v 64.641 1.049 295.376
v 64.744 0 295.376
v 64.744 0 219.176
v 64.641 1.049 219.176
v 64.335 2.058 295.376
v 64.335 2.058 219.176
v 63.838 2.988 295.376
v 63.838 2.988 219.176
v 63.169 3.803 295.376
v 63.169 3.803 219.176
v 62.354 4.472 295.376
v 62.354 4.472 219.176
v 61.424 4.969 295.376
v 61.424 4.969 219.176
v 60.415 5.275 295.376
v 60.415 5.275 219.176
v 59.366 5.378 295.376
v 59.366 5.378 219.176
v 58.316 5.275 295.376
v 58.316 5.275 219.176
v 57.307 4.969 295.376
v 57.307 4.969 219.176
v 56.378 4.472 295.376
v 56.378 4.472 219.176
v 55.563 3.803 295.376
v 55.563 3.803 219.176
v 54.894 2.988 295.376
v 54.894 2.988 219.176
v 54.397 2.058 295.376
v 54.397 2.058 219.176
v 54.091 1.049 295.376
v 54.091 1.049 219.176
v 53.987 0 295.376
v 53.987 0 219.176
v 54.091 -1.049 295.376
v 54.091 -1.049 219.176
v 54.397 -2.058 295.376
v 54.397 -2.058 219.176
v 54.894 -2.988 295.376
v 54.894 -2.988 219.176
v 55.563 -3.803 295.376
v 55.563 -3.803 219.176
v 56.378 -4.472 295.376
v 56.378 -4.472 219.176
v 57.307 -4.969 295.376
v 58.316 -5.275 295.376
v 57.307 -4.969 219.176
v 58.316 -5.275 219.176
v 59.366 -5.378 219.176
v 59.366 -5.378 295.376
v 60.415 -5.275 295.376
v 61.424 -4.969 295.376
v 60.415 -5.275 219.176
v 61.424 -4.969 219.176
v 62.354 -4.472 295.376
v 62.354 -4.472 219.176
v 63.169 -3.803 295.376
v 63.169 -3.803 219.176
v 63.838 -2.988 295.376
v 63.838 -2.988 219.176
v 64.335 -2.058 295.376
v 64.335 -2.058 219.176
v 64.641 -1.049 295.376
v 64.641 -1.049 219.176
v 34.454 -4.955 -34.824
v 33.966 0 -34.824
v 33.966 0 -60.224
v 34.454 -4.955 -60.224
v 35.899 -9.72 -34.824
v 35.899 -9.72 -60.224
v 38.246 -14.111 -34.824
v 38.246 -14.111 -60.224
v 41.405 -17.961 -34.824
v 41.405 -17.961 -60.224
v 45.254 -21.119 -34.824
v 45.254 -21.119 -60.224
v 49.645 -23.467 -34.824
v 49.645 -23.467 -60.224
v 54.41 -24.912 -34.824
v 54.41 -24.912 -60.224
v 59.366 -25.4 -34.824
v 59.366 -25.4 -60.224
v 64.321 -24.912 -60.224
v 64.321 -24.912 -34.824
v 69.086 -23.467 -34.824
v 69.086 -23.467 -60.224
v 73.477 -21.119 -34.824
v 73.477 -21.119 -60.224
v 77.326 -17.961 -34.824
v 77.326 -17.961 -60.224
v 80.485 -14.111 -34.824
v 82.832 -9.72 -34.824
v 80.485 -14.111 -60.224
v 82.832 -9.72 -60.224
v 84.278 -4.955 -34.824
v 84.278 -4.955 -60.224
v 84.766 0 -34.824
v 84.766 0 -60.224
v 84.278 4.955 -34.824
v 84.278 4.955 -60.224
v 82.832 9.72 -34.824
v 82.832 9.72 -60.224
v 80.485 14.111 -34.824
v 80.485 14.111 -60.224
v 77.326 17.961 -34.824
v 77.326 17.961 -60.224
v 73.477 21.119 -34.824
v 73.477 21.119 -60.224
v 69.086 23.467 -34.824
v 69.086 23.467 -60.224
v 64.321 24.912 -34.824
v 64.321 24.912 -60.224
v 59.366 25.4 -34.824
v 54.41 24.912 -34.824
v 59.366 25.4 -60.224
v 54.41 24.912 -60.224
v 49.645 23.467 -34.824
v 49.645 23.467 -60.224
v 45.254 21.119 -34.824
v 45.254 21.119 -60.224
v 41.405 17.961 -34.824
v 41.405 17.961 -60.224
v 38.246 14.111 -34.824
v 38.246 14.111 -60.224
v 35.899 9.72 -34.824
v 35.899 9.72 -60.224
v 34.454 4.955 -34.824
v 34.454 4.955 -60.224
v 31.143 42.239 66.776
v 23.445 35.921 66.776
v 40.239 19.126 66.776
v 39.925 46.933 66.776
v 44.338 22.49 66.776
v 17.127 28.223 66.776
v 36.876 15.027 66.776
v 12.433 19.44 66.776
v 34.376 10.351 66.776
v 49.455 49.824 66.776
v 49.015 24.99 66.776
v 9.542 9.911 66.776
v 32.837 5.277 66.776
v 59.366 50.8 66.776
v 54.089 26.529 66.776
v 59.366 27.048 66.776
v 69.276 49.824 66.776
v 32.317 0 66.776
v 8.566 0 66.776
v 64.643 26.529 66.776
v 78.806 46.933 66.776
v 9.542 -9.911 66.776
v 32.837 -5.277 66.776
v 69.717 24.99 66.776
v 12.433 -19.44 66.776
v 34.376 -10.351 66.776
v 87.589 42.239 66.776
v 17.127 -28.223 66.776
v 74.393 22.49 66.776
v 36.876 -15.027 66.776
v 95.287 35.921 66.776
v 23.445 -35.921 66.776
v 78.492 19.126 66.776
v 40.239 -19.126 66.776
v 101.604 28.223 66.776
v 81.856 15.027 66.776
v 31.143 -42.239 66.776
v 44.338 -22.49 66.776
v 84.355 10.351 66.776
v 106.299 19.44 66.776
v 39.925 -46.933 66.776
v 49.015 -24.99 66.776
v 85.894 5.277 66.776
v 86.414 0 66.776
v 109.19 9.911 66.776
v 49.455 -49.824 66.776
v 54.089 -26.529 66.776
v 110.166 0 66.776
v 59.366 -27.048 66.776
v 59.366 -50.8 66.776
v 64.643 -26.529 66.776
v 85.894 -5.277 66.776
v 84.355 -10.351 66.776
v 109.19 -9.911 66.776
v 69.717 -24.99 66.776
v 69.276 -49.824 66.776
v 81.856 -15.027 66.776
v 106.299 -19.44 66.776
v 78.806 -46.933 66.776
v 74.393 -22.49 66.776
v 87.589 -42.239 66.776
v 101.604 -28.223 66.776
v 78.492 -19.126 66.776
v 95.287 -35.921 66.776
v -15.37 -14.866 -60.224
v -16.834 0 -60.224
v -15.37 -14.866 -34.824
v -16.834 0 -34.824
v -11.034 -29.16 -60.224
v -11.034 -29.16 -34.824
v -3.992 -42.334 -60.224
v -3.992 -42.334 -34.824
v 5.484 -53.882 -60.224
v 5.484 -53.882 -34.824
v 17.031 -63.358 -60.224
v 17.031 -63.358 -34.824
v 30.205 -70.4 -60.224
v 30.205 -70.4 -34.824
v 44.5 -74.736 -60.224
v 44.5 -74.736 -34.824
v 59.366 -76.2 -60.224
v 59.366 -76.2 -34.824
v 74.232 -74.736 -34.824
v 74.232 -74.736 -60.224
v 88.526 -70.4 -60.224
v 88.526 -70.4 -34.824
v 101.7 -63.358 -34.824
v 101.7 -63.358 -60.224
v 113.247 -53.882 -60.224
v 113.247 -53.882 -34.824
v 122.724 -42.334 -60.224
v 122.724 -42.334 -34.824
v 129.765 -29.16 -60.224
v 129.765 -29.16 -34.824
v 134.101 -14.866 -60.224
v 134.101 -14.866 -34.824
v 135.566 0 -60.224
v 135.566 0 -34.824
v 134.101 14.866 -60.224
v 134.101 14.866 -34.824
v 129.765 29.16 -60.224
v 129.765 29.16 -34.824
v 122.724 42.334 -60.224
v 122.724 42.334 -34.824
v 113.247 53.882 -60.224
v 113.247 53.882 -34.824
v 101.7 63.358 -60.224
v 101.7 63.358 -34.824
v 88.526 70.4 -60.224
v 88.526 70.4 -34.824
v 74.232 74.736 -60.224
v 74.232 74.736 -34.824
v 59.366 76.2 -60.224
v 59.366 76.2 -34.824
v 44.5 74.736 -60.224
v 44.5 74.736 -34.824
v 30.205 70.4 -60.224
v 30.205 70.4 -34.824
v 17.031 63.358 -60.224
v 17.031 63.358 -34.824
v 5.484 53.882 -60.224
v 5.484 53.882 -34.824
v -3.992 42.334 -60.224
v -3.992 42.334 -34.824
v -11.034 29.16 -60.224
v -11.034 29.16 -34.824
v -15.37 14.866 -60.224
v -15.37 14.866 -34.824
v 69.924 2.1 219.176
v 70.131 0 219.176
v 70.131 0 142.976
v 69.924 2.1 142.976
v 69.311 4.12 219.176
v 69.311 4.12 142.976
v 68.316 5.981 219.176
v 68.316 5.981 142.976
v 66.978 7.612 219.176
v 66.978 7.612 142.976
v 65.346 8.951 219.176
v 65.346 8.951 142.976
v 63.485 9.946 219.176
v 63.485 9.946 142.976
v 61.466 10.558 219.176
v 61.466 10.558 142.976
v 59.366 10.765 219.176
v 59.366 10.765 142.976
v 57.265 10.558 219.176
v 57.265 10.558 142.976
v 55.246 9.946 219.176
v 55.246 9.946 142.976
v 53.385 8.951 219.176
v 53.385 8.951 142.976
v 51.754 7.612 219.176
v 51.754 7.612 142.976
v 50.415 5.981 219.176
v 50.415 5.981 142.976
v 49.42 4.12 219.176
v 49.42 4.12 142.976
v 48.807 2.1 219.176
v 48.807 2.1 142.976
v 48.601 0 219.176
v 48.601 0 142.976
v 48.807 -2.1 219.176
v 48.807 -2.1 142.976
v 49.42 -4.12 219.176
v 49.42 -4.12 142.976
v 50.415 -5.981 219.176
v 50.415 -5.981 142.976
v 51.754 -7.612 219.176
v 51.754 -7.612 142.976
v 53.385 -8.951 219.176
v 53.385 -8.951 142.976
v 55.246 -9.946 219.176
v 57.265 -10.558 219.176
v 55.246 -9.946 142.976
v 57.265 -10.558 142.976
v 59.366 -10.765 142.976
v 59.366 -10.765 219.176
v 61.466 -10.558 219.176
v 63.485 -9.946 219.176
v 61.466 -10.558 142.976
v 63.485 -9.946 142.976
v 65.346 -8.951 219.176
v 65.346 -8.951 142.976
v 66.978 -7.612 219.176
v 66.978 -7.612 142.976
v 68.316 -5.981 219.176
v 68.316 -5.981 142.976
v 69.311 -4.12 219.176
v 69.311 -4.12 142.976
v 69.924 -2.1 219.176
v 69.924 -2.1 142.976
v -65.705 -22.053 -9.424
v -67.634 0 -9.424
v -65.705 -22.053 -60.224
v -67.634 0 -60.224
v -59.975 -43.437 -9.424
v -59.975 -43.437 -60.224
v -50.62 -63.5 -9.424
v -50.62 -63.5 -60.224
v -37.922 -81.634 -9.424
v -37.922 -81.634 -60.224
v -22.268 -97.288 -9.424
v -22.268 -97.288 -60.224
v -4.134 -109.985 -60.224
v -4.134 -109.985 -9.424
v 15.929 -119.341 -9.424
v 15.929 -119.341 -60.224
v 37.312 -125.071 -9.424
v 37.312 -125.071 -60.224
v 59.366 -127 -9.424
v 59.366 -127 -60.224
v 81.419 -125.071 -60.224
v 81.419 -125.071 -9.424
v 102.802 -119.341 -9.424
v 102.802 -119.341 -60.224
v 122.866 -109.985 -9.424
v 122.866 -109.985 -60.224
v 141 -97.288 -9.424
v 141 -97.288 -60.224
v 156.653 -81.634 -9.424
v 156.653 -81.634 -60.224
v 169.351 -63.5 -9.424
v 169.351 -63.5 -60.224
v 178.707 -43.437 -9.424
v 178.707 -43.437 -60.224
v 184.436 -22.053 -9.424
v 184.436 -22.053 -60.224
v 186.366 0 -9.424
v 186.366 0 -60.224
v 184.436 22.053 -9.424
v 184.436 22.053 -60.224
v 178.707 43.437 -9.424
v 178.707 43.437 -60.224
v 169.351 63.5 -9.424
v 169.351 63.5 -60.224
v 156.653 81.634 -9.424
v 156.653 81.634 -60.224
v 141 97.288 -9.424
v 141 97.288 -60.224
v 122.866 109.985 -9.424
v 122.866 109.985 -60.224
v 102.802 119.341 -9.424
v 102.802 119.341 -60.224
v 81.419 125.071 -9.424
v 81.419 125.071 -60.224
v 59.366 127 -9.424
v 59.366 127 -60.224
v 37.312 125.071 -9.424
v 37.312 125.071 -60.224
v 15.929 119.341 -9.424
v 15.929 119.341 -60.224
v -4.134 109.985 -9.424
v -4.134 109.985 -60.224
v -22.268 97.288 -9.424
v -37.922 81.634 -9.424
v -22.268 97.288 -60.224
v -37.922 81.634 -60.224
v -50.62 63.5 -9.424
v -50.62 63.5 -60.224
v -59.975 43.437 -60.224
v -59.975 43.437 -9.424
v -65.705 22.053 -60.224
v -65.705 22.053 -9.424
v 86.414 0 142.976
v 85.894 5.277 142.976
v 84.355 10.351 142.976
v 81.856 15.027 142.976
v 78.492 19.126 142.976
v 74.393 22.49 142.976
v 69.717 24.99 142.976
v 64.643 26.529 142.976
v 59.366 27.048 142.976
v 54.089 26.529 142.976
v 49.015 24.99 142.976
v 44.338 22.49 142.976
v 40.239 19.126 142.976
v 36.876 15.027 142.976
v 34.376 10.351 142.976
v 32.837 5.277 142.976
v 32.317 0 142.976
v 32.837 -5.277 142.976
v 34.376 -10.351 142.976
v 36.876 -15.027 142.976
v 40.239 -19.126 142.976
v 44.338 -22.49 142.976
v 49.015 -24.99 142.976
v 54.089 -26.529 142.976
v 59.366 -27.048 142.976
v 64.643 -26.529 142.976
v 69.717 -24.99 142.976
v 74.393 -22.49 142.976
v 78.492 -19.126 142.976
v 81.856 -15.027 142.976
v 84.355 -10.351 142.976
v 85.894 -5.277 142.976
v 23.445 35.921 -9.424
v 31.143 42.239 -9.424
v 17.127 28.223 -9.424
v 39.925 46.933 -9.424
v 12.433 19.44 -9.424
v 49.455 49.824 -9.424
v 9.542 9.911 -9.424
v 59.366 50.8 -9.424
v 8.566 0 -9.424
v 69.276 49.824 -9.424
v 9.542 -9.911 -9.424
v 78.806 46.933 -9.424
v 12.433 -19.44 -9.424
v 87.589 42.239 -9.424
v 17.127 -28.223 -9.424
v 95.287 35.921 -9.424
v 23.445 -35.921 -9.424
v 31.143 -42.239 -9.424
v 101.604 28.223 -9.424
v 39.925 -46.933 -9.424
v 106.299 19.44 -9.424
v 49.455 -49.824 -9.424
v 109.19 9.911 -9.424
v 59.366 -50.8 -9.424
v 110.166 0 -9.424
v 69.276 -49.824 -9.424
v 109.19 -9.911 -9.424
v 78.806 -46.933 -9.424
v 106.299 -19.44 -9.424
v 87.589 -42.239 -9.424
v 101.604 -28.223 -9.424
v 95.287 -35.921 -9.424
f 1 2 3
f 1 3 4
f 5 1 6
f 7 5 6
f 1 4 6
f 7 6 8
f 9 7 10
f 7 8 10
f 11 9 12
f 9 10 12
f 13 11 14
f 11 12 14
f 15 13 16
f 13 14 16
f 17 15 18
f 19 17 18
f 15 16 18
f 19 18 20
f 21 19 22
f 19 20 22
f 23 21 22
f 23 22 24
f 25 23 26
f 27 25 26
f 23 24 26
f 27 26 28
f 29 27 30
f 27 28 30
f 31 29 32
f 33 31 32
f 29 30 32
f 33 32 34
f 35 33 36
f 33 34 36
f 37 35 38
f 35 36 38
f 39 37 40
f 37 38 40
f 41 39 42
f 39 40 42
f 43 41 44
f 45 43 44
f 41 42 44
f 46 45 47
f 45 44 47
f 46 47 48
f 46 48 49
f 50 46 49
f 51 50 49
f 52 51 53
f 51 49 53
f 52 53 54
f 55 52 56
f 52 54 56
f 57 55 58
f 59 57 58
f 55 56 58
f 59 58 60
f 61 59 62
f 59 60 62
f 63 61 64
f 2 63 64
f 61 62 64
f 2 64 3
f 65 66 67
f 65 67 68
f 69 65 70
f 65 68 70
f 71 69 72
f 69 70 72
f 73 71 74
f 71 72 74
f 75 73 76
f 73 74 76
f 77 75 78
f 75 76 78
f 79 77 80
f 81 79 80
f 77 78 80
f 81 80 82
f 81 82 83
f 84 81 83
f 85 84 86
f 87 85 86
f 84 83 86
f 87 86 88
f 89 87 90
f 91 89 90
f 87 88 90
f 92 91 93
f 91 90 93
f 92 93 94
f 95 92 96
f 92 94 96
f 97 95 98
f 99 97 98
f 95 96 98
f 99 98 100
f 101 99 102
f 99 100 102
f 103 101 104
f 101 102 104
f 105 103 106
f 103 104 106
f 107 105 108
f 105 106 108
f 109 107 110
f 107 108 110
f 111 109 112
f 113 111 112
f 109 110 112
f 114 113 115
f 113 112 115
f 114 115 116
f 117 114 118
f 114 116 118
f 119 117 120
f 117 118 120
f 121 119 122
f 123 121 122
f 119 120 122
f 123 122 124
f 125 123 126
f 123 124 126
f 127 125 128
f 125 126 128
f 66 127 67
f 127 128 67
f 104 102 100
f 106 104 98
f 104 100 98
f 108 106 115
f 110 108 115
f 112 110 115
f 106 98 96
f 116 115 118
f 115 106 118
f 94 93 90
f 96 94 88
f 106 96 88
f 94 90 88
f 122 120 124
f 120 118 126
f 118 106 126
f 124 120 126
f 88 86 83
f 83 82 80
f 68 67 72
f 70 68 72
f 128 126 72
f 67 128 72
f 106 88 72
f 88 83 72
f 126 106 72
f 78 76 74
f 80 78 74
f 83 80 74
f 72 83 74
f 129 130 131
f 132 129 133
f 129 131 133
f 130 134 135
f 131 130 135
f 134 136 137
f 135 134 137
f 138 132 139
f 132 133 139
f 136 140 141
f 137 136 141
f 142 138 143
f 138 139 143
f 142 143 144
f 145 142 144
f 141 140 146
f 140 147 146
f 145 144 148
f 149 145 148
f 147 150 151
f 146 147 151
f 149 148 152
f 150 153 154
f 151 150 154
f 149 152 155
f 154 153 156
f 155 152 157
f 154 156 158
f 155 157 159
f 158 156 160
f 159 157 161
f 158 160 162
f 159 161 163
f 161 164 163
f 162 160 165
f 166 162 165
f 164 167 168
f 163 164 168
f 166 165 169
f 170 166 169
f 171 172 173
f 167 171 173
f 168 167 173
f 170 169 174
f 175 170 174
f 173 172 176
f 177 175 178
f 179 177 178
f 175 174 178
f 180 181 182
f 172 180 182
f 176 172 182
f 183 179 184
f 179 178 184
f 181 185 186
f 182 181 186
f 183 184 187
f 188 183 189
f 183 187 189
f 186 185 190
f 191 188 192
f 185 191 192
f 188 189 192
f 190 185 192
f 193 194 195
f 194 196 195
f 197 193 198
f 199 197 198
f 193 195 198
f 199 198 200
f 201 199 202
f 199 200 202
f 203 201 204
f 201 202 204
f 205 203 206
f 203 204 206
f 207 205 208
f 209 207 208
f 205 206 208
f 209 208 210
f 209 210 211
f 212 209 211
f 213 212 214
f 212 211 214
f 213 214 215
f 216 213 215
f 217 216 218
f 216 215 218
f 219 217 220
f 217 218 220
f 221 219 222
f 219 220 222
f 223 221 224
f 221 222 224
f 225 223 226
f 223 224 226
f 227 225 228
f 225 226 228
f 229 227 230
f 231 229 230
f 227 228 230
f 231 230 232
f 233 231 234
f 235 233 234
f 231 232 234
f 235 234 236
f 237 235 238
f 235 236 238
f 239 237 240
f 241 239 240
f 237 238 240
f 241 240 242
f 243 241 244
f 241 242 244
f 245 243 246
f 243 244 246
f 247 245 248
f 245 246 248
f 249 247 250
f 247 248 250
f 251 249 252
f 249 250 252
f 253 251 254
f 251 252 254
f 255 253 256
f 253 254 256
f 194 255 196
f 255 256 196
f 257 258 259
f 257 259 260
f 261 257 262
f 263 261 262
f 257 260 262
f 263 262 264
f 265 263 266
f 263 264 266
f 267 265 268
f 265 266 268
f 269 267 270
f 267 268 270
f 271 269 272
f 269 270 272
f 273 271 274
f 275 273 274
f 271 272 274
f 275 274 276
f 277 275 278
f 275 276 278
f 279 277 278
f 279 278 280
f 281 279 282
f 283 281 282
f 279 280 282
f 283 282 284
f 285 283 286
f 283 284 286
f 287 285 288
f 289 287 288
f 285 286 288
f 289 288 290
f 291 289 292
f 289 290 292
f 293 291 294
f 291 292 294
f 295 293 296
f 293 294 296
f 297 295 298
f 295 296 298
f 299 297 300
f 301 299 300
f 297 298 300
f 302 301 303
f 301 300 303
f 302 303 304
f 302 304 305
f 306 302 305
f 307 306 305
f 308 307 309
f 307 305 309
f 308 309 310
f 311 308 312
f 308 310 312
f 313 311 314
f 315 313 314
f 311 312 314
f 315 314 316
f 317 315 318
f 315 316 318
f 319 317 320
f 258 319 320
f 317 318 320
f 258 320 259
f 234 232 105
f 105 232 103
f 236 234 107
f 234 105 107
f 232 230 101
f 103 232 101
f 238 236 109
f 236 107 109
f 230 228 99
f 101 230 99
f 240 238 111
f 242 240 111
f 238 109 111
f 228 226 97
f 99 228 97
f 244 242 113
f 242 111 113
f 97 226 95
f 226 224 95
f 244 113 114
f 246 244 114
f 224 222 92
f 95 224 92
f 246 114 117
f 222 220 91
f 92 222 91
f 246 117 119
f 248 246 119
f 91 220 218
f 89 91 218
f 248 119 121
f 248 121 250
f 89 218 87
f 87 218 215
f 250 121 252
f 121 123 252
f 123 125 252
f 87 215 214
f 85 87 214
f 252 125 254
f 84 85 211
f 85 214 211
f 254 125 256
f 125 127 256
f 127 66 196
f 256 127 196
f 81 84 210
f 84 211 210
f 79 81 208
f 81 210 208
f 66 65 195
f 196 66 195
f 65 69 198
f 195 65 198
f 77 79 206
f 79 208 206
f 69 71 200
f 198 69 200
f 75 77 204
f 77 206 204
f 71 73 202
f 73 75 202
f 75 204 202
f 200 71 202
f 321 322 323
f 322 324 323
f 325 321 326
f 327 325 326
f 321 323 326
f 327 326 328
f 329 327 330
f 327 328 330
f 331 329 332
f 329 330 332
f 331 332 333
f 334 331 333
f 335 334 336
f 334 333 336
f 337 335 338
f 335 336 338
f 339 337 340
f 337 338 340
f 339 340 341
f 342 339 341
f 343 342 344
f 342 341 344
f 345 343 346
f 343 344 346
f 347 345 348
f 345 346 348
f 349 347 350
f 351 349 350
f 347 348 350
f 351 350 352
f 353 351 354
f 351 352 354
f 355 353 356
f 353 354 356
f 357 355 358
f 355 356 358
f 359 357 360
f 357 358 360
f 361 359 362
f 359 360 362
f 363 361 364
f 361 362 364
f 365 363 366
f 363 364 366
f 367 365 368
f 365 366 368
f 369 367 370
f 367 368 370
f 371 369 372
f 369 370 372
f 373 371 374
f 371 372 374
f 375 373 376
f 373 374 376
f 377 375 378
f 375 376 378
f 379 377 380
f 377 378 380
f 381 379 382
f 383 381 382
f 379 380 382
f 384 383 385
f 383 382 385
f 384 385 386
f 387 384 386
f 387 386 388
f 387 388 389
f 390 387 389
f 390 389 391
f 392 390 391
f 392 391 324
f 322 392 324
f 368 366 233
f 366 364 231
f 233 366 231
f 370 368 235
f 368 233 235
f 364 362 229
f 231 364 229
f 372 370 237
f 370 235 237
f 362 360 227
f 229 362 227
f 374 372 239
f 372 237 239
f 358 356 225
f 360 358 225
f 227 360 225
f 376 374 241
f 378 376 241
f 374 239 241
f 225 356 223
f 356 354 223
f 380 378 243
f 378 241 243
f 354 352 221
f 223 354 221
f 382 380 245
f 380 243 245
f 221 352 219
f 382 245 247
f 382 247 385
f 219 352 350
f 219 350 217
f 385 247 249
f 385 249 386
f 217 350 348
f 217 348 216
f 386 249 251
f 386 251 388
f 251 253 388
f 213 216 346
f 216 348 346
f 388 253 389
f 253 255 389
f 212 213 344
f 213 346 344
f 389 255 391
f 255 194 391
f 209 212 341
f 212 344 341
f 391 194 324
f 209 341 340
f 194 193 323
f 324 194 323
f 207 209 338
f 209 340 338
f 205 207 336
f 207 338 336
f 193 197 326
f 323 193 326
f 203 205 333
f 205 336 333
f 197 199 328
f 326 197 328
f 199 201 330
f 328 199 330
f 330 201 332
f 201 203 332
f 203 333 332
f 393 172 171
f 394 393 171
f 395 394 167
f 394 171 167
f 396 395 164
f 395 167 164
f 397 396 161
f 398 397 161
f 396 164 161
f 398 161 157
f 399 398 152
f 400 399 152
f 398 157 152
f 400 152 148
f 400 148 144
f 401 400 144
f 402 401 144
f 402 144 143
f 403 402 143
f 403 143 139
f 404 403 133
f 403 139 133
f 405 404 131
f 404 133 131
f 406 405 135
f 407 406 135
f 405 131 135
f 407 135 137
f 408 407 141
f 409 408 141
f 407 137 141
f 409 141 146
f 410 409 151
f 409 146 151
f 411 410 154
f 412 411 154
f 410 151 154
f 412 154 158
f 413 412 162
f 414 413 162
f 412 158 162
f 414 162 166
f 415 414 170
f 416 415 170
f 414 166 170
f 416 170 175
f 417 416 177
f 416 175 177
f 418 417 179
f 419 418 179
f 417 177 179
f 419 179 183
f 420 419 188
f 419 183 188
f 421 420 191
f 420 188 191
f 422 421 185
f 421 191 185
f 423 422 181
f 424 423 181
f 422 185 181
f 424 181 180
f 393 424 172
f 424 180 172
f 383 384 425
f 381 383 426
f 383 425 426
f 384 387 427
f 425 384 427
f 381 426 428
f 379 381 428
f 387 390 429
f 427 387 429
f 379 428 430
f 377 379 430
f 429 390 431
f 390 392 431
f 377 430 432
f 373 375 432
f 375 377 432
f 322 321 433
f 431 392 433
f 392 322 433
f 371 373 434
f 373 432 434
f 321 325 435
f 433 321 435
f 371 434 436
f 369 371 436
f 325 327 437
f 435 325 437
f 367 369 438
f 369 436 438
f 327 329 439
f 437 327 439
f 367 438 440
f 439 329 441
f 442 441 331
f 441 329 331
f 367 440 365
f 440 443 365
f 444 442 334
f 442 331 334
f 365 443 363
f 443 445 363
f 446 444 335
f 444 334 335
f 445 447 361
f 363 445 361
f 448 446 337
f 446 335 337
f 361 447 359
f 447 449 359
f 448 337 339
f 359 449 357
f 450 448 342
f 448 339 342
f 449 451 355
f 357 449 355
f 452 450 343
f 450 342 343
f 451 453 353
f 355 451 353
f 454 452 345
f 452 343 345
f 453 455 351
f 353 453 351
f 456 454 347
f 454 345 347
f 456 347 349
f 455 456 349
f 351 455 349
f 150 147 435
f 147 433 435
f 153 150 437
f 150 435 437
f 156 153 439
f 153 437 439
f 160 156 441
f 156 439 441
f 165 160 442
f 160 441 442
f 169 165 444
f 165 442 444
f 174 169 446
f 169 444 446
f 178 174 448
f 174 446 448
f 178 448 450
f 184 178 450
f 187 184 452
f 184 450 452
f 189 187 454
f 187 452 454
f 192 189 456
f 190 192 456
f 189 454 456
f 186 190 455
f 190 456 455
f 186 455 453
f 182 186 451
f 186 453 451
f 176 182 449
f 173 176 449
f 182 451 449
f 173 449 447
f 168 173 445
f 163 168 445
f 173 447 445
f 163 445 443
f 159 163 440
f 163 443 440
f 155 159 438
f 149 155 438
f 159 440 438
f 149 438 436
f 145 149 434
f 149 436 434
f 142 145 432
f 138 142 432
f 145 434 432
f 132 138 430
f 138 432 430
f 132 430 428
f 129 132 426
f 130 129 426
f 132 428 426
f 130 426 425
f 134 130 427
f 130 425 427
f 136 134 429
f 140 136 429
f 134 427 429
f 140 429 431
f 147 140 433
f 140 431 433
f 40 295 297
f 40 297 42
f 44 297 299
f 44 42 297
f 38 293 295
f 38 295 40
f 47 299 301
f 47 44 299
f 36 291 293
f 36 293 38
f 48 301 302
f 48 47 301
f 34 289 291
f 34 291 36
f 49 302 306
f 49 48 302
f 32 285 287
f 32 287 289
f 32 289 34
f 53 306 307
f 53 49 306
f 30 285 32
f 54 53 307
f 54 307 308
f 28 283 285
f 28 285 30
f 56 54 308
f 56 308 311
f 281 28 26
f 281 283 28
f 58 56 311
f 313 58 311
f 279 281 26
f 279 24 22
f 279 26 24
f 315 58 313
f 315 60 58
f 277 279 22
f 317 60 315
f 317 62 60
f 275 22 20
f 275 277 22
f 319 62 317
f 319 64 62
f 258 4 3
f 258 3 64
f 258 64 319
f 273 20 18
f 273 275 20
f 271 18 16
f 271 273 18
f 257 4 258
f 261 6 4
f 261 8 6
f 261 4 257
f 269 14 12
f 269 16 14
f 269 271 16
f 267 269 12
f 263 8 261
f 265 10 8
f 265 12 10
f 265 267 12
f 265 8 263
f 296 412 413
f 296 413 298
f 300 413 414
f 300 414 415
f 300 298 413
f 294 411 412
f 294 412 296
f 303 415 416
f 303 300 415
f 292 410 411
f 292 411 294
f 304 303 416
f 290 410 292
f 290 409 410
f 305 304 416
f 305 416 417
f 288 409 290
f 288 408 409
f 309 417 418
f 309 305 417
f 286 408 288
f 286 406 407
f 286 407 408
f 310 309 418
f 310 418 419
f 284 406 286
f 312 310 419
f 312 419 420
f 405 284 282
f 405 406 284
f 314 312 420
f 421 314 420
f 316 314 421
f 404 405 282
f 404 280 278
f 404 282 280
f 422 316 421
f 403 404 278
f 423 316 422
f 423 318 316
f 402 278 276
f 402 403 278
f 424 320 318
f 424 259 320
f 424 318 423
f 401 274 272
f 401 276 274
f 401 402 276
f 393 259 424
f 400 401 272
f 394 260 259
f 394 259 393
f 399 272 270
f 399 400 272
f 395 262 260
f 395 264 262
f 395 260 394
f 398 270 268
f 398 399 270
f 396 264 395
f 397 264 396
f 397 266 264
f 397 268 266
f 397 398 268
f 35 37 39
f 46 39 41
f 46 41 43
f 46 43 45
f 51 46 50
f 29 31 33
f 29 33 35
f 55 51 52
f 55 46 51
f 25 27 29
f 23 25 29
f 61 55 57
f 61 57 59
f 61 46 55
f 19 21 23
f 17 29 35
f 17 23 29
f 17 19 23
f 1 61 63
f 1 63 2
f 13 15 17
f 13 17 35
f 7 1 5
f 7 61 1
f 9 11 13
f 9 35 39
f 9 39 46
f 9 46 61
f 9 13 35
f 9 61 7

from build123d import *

# Parameters (mm, degrees)
F2_R     = 27.048464
F3_DEPTH = 76.2
F4_R     = 10.765067
F5_DEPTH = 76.2
F6_R     = 5.378354
F7_DEPTH = 76.2


with BuildPart() as f1:
    # F0 (on Front) → F1 (revolve)
    with BuildSketch(Plane.XZ):
        Polygon((8.565648, -9.424497), (-67.634352, -9.424497), (-67.634352, -60.224497), (-16.834352, -60.224497), (-16.834352, -34.824497), (33.965648, -34.824497), (33.965648, -60.224497), (59.365648, -60.224497), (59.365648, 66.775503), (8.565648, 66.775503), align=None)
    revolve(axis=Axis((59.365648, 0, 3.275503), (0, 0, 1)))

    # F2 (on face) → F3 (join)
    with BuildSketch(Plane.XY.offset(66.775503)):
        with Locations((59.365648, 0)):
            Circle(F2_R)
    extrude(amount=F3_DEPTH)

    # F4 (on face) → F5 (join)
    with BuildSketch(Plane.XY.offset(142.975503)):
        with Locations((59.365648, 0)):
            Circle(F4_R)
    extrude(amount=F5_DEPTH)

    # F6 (on face) → F7 (join)
    with BuildSketch(Plane.XY.offset(219.175503)):
        with Locations((59.365648, 0)):
            Circle(F6_R)
    extrude(amount=F7_DEPTH)


solid = f1.part
